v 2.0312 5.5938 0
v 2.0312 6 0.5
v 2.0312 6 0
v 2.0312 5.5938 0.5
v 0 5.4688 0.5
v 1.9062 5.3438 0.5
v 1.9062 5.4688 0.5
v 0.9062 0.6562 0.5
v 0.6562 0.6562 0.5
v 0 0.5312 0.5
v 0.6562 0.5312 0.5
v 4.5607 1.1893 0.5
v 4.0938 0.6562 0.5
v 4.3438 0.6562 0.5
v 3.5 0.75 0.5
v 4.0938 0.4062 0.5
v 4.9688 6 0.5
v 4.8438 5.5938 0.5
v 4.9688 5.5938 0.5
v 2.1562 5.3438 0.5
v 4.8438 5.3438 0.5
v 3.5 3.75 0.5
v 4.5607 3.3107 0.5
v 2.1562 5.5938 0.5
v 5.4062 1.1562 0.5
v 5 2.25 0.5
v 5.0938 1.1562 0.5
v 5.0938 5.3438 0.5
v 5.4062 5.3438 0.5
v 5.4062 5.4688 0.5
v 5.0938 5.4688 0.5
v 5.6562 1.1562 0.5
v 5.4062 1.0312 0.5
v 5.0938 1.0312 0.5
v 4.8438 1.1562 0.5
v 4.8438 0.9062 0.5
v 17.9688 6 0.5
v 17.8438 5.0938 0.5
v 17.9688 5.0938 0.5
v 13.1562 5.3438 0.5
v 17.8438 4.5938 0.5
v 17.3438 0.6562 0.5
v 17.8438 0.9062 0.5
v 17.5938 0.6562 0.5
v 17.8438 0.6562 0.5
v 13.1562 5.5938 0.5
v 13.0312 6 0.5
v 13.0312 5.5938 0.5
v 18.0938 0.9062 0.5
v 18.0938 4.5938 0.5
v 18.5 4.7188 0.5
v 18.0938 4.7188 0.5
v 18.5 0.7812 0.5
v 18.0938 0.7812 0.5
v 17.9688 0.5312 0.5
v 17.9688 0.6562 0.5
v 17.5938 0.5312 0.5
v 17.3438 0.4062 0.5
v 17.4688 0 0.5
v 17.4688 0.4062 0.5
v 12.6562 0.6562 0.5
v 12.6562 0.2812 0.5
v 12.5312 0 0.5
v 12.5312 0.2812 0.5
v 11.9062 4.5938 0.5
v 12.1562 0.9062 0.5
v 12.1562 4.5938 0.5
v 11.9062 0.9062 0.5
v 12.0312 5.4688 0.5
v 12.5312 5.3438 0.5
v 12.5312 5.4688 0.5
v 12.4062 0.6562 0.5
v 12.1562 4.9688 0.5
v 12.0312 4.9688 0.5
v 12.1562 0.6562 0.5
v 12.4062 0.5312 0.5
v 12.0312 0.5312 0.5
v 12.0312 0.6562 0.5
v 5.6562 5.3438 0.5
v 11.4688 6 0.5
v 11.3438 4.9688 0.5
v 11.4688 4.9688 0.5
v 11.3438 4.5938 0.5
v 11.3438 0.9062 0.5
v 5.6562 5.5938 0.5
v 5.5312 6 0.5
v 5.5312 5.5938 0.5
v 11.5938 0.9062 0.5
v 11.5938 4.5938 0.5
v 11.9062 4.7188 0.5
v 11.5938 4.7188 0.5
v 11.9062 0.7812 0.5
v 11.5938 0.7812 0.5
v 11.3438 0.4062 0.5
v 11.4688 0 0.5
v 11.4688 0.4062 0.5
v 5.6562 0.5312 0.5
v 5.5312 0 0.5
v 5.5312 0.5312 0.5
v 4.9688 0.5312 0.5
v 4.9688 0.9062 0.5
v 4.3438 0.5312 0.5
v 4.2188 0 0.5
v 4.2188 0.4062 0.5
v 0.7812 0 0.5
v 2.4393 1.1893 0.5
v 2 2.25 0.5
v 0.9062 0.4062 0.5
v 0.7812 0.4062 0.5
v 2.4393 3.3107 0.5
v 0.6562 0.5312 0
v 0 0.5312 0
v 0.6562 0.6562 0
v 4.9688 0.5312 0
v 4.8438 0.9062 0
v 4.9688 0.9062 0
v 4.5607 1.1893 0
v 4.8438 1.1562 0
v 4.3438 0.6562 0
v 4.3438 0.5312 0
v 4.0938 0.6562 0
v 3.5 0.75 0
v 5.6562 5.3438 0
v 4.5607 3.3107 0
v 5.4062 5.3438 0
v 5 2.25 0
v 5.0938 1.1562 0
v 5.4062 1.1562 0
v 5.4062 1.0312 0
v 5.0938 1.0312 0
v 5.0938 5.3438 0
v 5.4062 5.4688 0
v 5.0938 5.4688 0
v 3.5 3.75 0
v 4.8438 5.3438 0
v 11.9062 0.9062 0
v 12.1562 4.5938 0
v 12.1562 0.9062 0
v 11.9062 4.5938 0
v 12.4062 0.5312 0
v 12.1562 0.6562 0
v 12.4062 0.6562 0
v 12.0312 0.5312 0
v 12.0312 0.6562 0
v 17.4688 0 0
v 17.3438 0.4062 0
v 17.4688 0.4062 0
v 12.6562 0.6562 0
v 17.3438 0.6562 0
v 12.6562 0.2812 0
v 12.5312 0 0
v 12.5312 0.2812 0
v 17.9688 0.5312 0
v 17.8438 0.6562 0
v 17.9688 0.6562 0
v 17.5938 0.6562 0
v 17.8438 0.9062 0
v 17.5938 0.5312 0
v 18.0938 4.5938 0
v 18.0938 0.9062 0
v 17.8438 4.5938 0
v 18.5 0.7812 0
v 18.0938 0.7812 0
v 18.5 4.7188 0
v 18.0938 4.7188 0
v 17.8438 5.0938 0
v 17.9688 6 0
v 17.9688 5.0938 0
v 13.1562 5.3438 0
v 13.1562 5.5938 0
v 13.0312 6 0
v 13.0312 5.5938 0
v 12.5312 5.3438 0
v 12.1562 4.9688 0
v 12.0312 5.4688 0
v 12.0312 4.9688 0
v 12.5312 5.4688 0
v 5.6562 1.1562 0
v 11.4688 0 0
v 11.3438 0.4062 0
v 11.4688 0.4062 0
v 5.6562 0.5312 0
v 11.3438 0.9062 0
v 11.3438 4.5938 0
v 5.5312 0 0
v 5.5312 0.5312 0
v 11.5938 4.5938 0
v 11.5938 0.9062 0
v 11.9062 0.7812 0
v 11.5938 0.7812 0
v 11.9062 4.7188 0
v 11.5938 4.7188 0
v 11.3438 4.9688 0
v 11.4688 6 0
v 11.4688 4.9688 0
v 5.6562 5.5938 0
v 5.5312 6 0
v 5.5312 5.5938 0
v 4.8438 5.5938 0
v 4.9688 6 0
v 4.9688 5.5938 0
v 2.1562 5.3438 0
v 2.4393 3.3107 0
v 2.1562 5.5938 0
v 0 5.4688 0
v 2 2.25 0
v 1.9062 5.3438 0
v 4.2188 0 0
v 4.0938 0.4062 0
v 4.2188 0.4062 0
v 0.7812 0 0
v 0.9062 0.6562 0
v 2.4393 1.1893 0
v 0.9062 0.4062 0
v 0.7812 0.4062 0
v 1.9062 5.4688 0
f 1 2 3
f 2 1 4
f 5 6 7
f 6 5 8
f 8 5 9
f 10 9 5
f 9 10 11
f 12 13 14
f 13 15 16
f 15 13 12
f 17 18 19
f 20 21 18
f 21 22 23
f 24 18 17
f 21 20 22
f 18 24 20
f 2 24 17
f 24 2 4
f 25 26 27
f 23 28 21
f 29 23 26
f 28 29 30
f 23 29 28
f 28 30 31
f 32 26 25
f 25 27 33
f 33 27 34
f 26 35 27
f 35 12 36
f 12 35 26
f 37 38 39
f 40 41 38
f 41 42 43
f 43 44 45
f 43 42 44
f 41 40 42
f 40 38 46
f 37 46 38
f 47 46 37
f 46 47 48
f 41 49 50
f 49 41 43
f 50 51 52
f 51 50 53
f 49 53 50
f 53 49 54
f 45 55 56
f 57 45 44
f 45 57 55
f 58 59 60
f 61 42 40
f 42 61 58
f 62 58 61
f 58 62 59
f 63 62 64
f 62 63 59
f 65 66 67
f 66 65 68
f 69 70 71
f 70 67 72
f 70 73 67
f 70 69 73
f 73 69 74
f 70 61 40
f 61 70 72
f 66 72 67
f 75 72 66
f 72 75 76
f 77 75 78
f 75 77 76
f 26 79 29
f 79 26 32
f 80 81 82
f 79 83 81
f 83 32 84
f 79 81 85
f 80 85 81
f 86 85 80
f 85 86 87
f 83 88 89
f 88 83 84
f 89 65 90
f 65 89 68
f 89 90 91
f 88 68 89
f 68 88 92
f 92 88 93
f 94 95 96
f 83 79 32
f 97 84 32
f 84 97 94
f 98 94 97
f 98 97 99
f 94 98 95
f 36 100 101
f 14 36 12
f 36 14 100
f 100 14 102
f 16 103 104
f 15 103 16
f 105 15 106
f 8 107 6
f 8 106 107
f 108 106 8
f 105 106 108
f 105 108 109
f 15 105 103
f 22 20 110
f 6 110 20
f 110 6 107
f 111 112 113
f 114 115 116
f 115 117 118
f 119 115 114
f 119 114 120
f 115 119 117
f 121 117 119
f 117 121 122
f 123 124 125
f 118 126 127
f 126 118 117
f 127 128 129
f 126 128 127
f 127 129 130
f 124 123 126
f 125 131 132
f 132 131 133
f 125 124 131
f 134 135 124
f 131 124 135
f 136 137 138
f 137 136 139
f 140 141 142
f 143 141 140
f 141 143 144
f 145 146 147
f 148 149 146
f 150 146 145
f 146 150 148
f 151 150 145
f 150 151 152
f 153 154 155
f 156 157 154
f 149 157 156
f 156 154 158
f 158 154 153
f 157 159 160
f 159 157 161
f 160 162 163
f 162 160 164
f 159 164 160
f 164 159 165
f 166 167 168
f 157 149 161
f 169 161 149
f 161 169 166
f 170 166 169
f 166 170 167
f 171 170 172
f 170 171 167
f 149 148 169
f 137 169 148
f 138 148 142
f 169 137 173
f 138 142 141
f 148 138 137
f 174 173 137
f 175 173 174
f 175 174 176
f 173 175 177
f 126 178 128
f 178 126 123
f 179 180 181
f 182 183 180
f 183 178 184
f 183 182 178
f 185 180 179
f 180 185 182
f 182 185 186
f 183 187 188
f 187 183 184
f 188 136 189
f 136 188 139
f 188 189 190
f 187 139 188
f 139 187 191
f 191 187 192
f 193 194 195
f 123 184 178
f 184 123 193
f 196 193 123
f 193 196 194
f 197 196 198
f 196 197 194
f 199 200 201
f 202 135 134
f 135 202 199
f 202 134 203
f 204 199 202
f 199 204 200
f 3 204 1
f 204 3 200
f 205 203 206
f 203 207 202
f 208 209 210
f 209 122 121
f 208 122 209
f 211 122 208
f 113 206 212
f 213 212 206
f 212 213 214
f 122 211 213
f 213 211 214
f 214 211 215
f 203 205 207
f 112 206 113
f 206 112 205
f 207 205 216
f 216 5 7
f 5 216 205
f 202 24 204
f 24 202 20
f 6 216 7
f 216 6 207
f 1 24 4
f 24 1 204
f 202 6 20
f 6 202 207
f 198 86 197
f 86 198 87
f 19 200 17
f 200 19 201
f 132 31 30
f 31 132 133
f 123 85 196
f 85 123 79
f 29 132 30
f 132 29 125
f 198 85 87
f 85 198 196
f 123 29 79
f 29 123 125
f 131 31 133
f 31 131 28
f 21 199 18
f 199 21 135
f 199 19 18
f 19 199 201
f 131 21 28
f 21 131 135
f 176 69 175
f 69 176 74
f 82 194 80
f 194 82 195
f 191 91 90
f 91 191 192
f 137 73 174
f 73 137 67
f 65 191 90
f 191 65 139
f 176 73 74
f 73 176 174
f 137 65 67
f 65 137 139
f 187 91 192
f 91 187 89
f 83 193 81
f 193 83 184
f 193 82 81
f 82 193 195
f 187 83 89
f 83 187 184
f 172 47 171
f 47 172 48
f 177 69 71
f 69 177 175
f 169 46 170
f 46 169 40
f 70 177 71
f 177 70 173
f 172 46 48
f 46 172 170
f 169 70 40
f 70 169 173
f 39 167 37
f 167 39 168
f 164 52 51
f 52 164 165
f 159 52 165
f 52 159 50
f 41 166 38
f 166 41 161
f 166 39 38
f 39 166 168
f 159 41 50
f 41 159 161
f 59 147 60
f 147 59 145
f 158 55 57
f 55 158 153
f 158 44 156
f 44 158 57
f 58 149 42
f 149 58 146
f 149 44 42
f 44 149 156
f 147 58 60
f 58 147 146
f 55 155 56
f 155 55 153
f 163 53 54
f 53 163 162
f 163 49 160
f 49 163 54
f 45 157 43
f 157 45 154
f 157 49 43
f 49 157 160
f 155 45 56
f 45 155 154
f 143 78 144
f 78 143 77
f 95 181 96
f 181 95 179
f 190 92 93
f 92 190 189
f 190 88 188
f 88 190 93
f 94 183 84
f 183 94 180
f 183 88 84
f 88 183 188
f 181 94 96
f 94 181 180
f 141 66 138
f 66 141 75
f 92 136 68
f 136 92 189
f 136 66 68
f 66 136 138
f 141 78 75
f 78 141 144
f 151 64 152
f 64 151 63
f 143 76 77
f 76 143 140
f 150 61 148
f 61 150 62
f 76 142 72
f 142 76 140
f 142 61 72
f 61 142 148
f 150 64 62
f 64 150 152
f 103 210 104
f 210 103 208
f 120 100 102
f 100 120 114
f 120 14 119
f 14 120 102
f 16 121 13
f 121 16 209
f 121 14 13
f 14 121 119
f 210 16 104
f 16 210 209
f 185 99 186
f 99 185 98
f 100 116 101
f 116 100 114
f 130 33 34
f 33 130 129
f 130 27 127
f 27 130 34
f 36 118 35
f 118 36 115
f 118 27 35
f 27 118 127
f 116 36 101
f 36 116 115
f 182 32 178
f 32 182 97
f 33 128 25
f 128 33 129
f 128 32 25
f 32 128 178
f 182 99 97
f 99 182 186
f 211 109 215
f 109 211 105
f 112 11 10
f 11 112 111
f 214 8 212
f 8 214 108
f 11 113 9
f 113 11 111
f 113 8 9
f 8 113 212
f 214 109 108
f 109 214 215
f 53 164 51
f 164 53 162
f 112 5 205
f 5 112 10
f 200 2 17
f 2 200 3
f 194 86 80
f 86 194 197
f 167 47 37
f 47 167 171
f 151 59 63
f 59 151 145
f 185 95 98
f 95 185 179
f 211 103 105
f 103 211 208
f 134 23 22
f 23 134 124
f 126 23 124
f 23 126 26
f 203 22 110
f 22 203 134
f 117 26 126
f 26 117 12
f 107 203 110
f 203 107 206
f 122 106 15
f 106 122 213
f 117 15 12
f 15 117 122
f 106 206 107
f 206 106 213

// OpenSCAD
// file: modus.scad
//Corner Joint - allows the sides of two parts to create inlayed corner. Aids with welding.
//need to verify module math is the same throughout all parts.

module cornerjoint(Z,L,H,EndGap,PadL,PadH,CJangle,CJcenter){
    //change so that H = Z of inlayed part (usually 0.5)
    //add center and angle in degrees option, orgin far side of cut out area

     if((CJangle==0)&&(CJcenter==0))
      {    
        translate([0,0,0])
        rotate([0,0,CJangle])
        difference(){
        cube([L,H+PadH,Z]);
        translate([EndGap,H,0])
        cube([PadL,PadH,Z]);
        translate([L-EndGap-PadL,H,0])
        cube([PadL,PadH,Z]);}
      }    
else if((CJangle==90)&&(CJcenter==0))
      {    
        translate([H+PadH,0,0])
        rotate([0,0,CJangle])
        difference(){
        cube([L,H+PadH,Z]);
        translate([EndGap,H,0])
        cube([PadL,PadH,Z]);
        translate([L-EndGap-PadL,H,0])
        cube([PadL,PadH,Z]);}
      }
else if((CJangle==180)&&(CJcenter==0))       
      {    
        translate([L,H+PadH,0])
        rotate([0,0,CJangle])
        difference(){
        cube([L,H+PadH,Z]);
        translate([EndGap,H,0])
        cube([PadL,PadH,Z]);
        translate([L-EndGap-PadL,H,0])
        cube([PadL,PadH,Z]);}
      }
else if((CJangle==270)&&(CJcenter==0))
      {    
        translate([0,L,0])
        rotate([0,0,CJangle])
        difference(){
        cube([L,H+PadH,Z]);
        translate([EndGap,H,0])
        cube([PadL,PadH,Z]);
        translate([L-EndGap-PadL,H,0])
        cube([PadL,PadH,Z]);}
      }  
      
//centered     
   
else if((CJangle==0)&&(CJcenter==1))
      {    
        translate([-L/2,0,0])
        rotate([0,0,CJangle])
        difference(){
        cube([L,H+PadH,Z]);
        translate([EndGap,H,0])
        cube([PadL,PadH,Z]);
        translate([L-EndGap-PadL,H,0])
        cube([PadL,PadH,Z]);}
      }  
else if((CJangle==90)&&(CJcenter==1))
      {    
        translate([0,-L/2,0])
        rotate([0,0,CJangle])
        difference(){
        cube([L,H+PadH,Z]);
        translate([EndGap,H,0])
        cube([PadL,PadH,Z]);
        translate([L-EndGap-PadL,H,0])
        cube([PadL,PadH,Z]);}
      }
else if((CJangle==180)&&(CJcenter==1))       
      {    
        translate([L/2,0,0])
        rotate([0,0,CJangle])
        difference(){
        cube([L,H+PadH,Z]);
        translate([EndGap,H,0])
        cube([PadL,PadH,Z]);
        translate([L-EndGap-PadL,H,0])
        cube([PadL,PadH,Z]);}
      }
else if((CJangle==270)&&(CJcenter==1))
      {    
        translate([0,L/2,0])
        rotate([0,0,CJangle])
        difference(){
        cube([L,H+PadH,Z]);
        translate([EndGap,H,0])
        cube([PadL,PadH,Z]);
        translate([L-EndGap-PadL,H,0])
        cube([PadL,PadH,Z]);}
      }
} //end cornerjoint module

//Tab Insert - used to cut a hole for an abutting part to insert into. Typically aids with welding the two parts.
module tabinsert(X,Y,Z,dGap,cGap,c1,c2,c3,c4,c5,c6,c7,c8,center){
    translate([-dGap-(center*(X/2)),-dGap-(center*(Y/2)),0]){
        //main cut
        cube([X+(dGap*2),Y+(dGap*2),Z]);
        //corner c1c2
        translate([-cGap,(Y+(dGap*2))-c1+cGap,0])
            {
        cube([c2,c1,Z]);}
       //corner c3c4
       translate([(X+(dGap*2))-c3+cGap,(Y+(dGap*2))-c4+cGap,0]){
           cube([c3,c4,Z]);
       }
       //corner c5c6
       translate([(X+(dGap*2))-c6+cGap,-cGap,0])
      {
          cube([c6,c5,Z]);
      }
       
       //corner c7c8 
       translate([-cGap,-cGap,0]){
           cube([c7,c8,Z]);
       }
    
    } //end center translate
} //end tabinsert module
 

module nut(flattoflat,nutheight){  //distance from one flat side to the other flat side "A/F"

//typical sizes found here:
//https://en.wikipedia.org/wiki/Nut_(hardware)

difference(){
    translate([0,0,nutheight/2])
cube(size = [10,10,nutheight], center = true);
    
for(i=[1:6]){
    rotate([0,0,i*60])
difference(){
    translate([-10,0,0])
    cube([20,20,nutheight]);
    translate([-10,0,0])
    cube([20,flattoflat/2,nutheight]);
}  //end difference
}  //end for
}  //end differeence
}  //end module
// file: vars.scad
brickW=6; 
brickL=24;
brickCH=6; //Is brick height being shortened by d1z??

//3.625 x 2.25 x 8
//6 x 12 x 6

grateX=56;
grateY=23;
grateH=37; //Height mounted above press's frame
grateA=17.5; //angle of grate

//grateX=56;
//grateY=23;
//grateH=37; //Height mounted above press's frame
//grateA=17.5; //angle of grate


$fn=8; //defines resolution of circles. 8 is okay for review. 100  or greater should be used for for final dxf export.

dZstandard=0.5; //thickness of steel to be cut for drawer parts
fZstandard=0.5;
aZstandard=0.5; //thickness of steel to be cut for arm parts
hZstandard=0.125;

fBOLTHOLEstandardD=1; //standard bolts used on frame
aBOLTHOLEstandardD=1;

sliderodholeOD=1.2; 
d1bushingOD=1.25;
d1bushingL=1.25;
d1shaftOD=1;
d1bolt1OD=1;
d1bolt2OD=0.75;
d1nut2AF=1.25;
d1nut2H=0.665;


dGap=0.03125; //gap between a hole cut's edge and the part sitting within the hole. //D3 appears to use 0.3125, is this in error?

//all parts set to standard thickness below
//off standard preferences can be defined below

//drawer
drawergap=0.0283;  //extra room for drawer to slide in the space between f1 and f4
drawerHgap=0.1884;  //total extra space from drawer sides to frame walls. sum of both sides.

d2clevispinaccessholeOD=3;

d1z=dZstandard;
d2z=dZstandard;
d3z=dZstandard;
d4z=dZstandard;
d5z=dZstandard;
d6z=dZstandard;
d5z=dZstandard;
d7z=dZstandard;
d8z=dZstandard;
d9z=dZstandard;

d11z=dZstandard;
d12z=dZstandard;


//frame

f1y=6;
f1z=fZstandard;


f2y=3.5;
f2z=fZstandard;

f3y=3.5;
f3z=fZstandard;

f4y=11;
f4z=fZstandard;

f5y=3.5;
f5z=fZstandard;

f6y=8;
f6z=fZstandard;

f8y=brickW;
f8z=fZstandard;
f8boltD=1;

f9y=4.5;

f9z=fZstandard;




f12z=fZstandard;   

f11x=1.25;
f11z=fZstandard;

f13z=fZstandard;

f14y=3.5;
f14z=fZstandard;

//arms

a1x=4;
a1z=aZstandard;
a1out=24; //length from frame to A5 edge for bricks to sit on as they exit

a2x=6;
a2z=aZstandard;

a3x=4;
a3y=72;
a3z=aZstandard;

a4x=6;
a4y=72;
a4z=aZstandard;

a5x=6;
a5y=72;
a5z=aZstandard;

a6z=aZstandard;

//guards

h1x=grateX;
h1y=grateH;  //might need to tweak for grate thickness

h1z=hZstandard;
h2z=hZstandard;
h3z=hZstandard;
h4z=hZstandard;
h5z=hZstandard;
h6z=hZstandard;
h7z=hZstandard;
h8z=hZstandard;

//
//Input your main cylinder's dimenions here
//
cylMainBore = 5;
cylMainStroke = 16;
cylMainExt = 43;
cylMainRet = 27;
cylMainA = (cylMainRet-cylMainStroke); //center to center minus stroke length
cylMainB = 0.25; // cylinder wall thickness
cylMainD = 2.5; //Rod OD
cylMainE = 5.75; //rear pin holder width
cylMainG = 4; //rod pin holder width
cylMainJ = 3.8; //distance from the end of the cylinder body to rod pin center
cylMainR = 1.52; //pin hole ID
cylMainS = 2.5; //pin holder OD

//
//Input your drawer cylinder's dimenions here
//
//
cylDrawerBore = 5;
cylDrawerStroke = 16;
cylDrawerExt = 43;
cylDrawerRet = 27;
cylDrawerA = (cylMainRet-cylMainStroke); //center to center minus stroke length
cylDrawerB = 0.25; // cylinder wall thickness
cylDrawerD = 2.5; //Rod OD
cylDrawerE = 5.75; //rear pin holder width
cylDrawerG = 4; //rod pin holder width
cylDrawerJ = 3.8; //distance from the end of the cylinder body to rod pin center
cylDrawerR = 1.52; //pin hole ID
cylDrawerS = 2.5; //pin holder OD

cylinderDRAWERbodyH=3; //measured when in position, largest length from top to bottom of cylinder
cylinderDRAWERminC2C=0; //drawer's hydraulic cylinder's distance from the center of one mounting hole to the center of the other when fully compressed.
cylinderDRAWERmaxC2C=0; ///drawer's hydraulic cylinder's distance from the center of one mounting hole to the center of the other when fully extended.
cylinderDRAWERrodclevisW=2.5; //width of cylinders' clevis on end of rod
cylinderDRAWERrodclevisID=1;
cylinderDRAWERrodclevisOD=2;
cylinderDRAWERrearclevisW=2.5; //width of mounting clevis cylinder body
cylinderDRAWERrearclevisID=1;
cylinderDRAWERrearclevisOD=2;
cylinderDRAWERrearclevisClearance=3; //usable space around rear clevis pin (in diameter). be aware of hyraulic fittings.

//the following variables are calculated in order of dependence on preceding variables

d3x=brickL+(d2z*2);
d3y=brickCH-d1z;
d4x=brickW+d3z+d3z;
d4y=brickCH-d1z;
d5x=brickL+(d2z*2);
d5y=brickW;
d6x=brickL+(d2z*2);
d6y=brickCH;
d7x=cylinderDRAWERrearclevisClearance;
d7y=a4z+d8z+cylinderDRAWERbodyH;
d9x=cylinderDRAWERbodyH+d6z; //should be based on clevis size?
d9y=cylinderDRAWERbodyH+d8z;
d8x=brickL+(d2z*2);
d8y=max(5,(d9x-d6z));   //need to review fundamentals, 5 minimun unless d9 gets larger than d8
d11x=1.5+(d1bolt1OD*2)+d1bushingOD;
d11y=max((0.5+d1bushingL),4);

d12x=d8x;
d12y=d11y+1;

f1x=((brickL+(d2z*2)+drawerHgap+(f9y*2)));
f3x=f1x;

d1x=(brickL+d2z+d2z);
//d1x=(((f1x/2)-(((brickL+(d2z*2)+drawerHgap)/2)-fZstandard-(sliderodholeOD/2)))+(d11x/2))*2;
d1y=((brickW+d3z+d3z)*3)+1;

d2x=d8y+d6z+brickW+d3z+d5y+d3z;
d2y=brickCH;



f11y=f8y;
f6x=brickL+(d2z*2)+(f9y*2)+drawerHgap;

f9x=(f2z+((cylMainS+0.125)/2)+cylMainRet-cylMainJ+1+f4y+drawergap+d2y+f1y);  //leaves 1" between top of cylinder and bottom of F4
f8x=f9x;


f2x=brickL+(d2z*2)+drawerHgap+(f9y*2)-(1.4*2);  //distance between large cut outs in f9

f5x=brickL+(d2z*2)+drawerHgap+(f9y*2)+(a1x*2); //distance between outer edges of each A1

f4x=f5x-0.5;   //same as f5 but minus 0.25 on each side to give a little overhang

f14x=brickL+(1*2)+(.125*2)+(dGap*2); 

f12x=f3x;
f12y=(f3y*2)+brickW;

sliderodoffset=(((brickL+(d2z*2)+drawerHgap)/2)-fZstandard-(sliderodholeOD/2));

distancetof8center=(cylDrawerExt+(a4x/2)+((d9x-d6z)/2)+d6z+(brickW/2)); //F8 center on A1

a1y=distancetof8center+(brickW/2)+a1out;
a2y=a1y;

h7x=f5x-((a1x/2)*2)+(1.5*2);
h7y=cylDrawerStroke;

h8x=f5x-((a1x/2)*2)+(1.5*2);
h8y=a1out-a5x-f5y;  //distance between a5 and f5

hopperBaseX=brickL;
hopperBaseY=brickW;

h2x=grateX;
h2y=sqrt(((h1y-(sin(grateA)*grateY))*(h1y-(sin(grateA)*grateY)))+(((cos(grateA)*grateY)-hopperBaseY)*((cos(grateA)*grateY)-hopperBaseY)));

//h1y-(sin(grateA)*grateY)
//(cos(grateA)*grateY)-hopperBaseY

echo(h1y-(sin(grateA)*grateY));
echo((cos(grateA)*grateY)-hopperBaseY);
echo(h2y);
echo(atan((h1y-(sin(grateA)*grateY))/((cos(grateA)*grateY)-hopperBaseY)));
echo((h1y-(sin(grateA)*grateY))/(h1y));

// ECHO - REQUIRED PARTS BASED ON INPUTS

echo(str("Minimum drawer cylinder stroke length: ",(d3z*2)+d5y+brickW));
//would be cool to validate and confirm user inputed stroke length. set error=1; if drawer cylinder is not long enough. print an echo warning.

echo(str("Grate hieght above ground level: ",(1)));
// main file
include <vars.scad>;
use <modus.scad>;

echo(d8y+d6z+brickW+d3z+d5y+d3z); //total length of part

d2p();

module d2p(){
    
difference(){
cube([d2x,d2y,d2z]);
    
    //cuts numbered clockwise from top left
    
    //1 - D12
    
    translate([0,d2y-d12z,0])
    tabinsert(d8y-f2y+d6z,d12z,d2z,dGap,0.125,0,0,0,0,0.25,0.25,0,0,0);
    
    //2 - D6
    
    translate([d8y,d2y-0.5,0])
    tabinsert(d6z,0.5,d2z,dGap,0.125,0,0,0,0,0.25,0.25,0.25,0.25,0);
    
    //3 - D3, D1
    
    translate([d8y+d6z+brickW,d2y-d1z-0.75,0])
    tabinsert(d3z,d1z+0.75,d2z,dGap,0.125,0,0,0,0,0.375,0.25,0.25,0.375,0);
    translate([d8y+d6z+brickW+d3z,d2y-d1z,0]) 
    tabinsert(1.5-d3z,d1z,d2z,dGap,0.125,0,0,0,0,0.25,0.625,0,0,0);
    
    //4 - D3, D1
    
    translate([d2x-d3z,d2y-0.75-d1z,0]) //put in far corner
    tabinsert(d3z,d1z+0.75,d2z,dGap,0.125,0,0,0,0,0,0,0.25,0.5,0);
    
    //5 - D3, D5
    
    translate([d8y+d6z+brickW+d3z+(d5y-0.5),0,0])
    tabinsert(0.5,d5z,d2z,dGap,0.125,0.25,0.25,0,0,0,0,0,0,0);
    translate([d8y+d6z+brickW+d3z+d5y,0,0])
    tabinsert(d3z,0.75,d2z,dGap,0.125,0.25,0.25,0,0,0,0,0,0,0);
    
    //6 -  D3, D5
    
    translate([d8y+d6z+brickW,0,0])
    tabinsert(d3z,0.75,d2z,dGap,0.125,0.5,0.25,0.25,0.25,0,0,0,0,0);
    translate([d8y+d6z+brickW+d3z,0,0]) 
    tabinsert(0.5,d5z,d2z,dGap,0.125,0,0,0.25,0.375,0,0,0,0,0);

    //7 - D6, D8 
    
    translate([d8y-0.75,0,0])
    tabinsert(0.75,d8z,d2z,dGap,0.125,0.25,0.25,0,0,0,0,0,0,0);
    translate([d8y,0,0])
    tabinsert(d6z,1,d2z,dGap,0.125,0.25,0.25,0.25,0.625,0,0,0,0,0);
    
    //8 - D8
    
    tabinsert(0.75,d8z,d2z,dGap,0.125,0,0,0.25,0.25,0,0,0,0,0);  
    
    //clovis pin access hole
    
    translate([min((d8y-(d2clevispinaccessholeOD/2)),(d8y-((d9x-d6z)/2))),max((d8z+0.25+(d2clevispinaccessholeOD/2)),(((d9y-d8z)/2)+d8z)),0])
    cylinder(h = d2z, r = d2clevispinaccessholeOD/2);
    
} //end difference

} //end d2p module
